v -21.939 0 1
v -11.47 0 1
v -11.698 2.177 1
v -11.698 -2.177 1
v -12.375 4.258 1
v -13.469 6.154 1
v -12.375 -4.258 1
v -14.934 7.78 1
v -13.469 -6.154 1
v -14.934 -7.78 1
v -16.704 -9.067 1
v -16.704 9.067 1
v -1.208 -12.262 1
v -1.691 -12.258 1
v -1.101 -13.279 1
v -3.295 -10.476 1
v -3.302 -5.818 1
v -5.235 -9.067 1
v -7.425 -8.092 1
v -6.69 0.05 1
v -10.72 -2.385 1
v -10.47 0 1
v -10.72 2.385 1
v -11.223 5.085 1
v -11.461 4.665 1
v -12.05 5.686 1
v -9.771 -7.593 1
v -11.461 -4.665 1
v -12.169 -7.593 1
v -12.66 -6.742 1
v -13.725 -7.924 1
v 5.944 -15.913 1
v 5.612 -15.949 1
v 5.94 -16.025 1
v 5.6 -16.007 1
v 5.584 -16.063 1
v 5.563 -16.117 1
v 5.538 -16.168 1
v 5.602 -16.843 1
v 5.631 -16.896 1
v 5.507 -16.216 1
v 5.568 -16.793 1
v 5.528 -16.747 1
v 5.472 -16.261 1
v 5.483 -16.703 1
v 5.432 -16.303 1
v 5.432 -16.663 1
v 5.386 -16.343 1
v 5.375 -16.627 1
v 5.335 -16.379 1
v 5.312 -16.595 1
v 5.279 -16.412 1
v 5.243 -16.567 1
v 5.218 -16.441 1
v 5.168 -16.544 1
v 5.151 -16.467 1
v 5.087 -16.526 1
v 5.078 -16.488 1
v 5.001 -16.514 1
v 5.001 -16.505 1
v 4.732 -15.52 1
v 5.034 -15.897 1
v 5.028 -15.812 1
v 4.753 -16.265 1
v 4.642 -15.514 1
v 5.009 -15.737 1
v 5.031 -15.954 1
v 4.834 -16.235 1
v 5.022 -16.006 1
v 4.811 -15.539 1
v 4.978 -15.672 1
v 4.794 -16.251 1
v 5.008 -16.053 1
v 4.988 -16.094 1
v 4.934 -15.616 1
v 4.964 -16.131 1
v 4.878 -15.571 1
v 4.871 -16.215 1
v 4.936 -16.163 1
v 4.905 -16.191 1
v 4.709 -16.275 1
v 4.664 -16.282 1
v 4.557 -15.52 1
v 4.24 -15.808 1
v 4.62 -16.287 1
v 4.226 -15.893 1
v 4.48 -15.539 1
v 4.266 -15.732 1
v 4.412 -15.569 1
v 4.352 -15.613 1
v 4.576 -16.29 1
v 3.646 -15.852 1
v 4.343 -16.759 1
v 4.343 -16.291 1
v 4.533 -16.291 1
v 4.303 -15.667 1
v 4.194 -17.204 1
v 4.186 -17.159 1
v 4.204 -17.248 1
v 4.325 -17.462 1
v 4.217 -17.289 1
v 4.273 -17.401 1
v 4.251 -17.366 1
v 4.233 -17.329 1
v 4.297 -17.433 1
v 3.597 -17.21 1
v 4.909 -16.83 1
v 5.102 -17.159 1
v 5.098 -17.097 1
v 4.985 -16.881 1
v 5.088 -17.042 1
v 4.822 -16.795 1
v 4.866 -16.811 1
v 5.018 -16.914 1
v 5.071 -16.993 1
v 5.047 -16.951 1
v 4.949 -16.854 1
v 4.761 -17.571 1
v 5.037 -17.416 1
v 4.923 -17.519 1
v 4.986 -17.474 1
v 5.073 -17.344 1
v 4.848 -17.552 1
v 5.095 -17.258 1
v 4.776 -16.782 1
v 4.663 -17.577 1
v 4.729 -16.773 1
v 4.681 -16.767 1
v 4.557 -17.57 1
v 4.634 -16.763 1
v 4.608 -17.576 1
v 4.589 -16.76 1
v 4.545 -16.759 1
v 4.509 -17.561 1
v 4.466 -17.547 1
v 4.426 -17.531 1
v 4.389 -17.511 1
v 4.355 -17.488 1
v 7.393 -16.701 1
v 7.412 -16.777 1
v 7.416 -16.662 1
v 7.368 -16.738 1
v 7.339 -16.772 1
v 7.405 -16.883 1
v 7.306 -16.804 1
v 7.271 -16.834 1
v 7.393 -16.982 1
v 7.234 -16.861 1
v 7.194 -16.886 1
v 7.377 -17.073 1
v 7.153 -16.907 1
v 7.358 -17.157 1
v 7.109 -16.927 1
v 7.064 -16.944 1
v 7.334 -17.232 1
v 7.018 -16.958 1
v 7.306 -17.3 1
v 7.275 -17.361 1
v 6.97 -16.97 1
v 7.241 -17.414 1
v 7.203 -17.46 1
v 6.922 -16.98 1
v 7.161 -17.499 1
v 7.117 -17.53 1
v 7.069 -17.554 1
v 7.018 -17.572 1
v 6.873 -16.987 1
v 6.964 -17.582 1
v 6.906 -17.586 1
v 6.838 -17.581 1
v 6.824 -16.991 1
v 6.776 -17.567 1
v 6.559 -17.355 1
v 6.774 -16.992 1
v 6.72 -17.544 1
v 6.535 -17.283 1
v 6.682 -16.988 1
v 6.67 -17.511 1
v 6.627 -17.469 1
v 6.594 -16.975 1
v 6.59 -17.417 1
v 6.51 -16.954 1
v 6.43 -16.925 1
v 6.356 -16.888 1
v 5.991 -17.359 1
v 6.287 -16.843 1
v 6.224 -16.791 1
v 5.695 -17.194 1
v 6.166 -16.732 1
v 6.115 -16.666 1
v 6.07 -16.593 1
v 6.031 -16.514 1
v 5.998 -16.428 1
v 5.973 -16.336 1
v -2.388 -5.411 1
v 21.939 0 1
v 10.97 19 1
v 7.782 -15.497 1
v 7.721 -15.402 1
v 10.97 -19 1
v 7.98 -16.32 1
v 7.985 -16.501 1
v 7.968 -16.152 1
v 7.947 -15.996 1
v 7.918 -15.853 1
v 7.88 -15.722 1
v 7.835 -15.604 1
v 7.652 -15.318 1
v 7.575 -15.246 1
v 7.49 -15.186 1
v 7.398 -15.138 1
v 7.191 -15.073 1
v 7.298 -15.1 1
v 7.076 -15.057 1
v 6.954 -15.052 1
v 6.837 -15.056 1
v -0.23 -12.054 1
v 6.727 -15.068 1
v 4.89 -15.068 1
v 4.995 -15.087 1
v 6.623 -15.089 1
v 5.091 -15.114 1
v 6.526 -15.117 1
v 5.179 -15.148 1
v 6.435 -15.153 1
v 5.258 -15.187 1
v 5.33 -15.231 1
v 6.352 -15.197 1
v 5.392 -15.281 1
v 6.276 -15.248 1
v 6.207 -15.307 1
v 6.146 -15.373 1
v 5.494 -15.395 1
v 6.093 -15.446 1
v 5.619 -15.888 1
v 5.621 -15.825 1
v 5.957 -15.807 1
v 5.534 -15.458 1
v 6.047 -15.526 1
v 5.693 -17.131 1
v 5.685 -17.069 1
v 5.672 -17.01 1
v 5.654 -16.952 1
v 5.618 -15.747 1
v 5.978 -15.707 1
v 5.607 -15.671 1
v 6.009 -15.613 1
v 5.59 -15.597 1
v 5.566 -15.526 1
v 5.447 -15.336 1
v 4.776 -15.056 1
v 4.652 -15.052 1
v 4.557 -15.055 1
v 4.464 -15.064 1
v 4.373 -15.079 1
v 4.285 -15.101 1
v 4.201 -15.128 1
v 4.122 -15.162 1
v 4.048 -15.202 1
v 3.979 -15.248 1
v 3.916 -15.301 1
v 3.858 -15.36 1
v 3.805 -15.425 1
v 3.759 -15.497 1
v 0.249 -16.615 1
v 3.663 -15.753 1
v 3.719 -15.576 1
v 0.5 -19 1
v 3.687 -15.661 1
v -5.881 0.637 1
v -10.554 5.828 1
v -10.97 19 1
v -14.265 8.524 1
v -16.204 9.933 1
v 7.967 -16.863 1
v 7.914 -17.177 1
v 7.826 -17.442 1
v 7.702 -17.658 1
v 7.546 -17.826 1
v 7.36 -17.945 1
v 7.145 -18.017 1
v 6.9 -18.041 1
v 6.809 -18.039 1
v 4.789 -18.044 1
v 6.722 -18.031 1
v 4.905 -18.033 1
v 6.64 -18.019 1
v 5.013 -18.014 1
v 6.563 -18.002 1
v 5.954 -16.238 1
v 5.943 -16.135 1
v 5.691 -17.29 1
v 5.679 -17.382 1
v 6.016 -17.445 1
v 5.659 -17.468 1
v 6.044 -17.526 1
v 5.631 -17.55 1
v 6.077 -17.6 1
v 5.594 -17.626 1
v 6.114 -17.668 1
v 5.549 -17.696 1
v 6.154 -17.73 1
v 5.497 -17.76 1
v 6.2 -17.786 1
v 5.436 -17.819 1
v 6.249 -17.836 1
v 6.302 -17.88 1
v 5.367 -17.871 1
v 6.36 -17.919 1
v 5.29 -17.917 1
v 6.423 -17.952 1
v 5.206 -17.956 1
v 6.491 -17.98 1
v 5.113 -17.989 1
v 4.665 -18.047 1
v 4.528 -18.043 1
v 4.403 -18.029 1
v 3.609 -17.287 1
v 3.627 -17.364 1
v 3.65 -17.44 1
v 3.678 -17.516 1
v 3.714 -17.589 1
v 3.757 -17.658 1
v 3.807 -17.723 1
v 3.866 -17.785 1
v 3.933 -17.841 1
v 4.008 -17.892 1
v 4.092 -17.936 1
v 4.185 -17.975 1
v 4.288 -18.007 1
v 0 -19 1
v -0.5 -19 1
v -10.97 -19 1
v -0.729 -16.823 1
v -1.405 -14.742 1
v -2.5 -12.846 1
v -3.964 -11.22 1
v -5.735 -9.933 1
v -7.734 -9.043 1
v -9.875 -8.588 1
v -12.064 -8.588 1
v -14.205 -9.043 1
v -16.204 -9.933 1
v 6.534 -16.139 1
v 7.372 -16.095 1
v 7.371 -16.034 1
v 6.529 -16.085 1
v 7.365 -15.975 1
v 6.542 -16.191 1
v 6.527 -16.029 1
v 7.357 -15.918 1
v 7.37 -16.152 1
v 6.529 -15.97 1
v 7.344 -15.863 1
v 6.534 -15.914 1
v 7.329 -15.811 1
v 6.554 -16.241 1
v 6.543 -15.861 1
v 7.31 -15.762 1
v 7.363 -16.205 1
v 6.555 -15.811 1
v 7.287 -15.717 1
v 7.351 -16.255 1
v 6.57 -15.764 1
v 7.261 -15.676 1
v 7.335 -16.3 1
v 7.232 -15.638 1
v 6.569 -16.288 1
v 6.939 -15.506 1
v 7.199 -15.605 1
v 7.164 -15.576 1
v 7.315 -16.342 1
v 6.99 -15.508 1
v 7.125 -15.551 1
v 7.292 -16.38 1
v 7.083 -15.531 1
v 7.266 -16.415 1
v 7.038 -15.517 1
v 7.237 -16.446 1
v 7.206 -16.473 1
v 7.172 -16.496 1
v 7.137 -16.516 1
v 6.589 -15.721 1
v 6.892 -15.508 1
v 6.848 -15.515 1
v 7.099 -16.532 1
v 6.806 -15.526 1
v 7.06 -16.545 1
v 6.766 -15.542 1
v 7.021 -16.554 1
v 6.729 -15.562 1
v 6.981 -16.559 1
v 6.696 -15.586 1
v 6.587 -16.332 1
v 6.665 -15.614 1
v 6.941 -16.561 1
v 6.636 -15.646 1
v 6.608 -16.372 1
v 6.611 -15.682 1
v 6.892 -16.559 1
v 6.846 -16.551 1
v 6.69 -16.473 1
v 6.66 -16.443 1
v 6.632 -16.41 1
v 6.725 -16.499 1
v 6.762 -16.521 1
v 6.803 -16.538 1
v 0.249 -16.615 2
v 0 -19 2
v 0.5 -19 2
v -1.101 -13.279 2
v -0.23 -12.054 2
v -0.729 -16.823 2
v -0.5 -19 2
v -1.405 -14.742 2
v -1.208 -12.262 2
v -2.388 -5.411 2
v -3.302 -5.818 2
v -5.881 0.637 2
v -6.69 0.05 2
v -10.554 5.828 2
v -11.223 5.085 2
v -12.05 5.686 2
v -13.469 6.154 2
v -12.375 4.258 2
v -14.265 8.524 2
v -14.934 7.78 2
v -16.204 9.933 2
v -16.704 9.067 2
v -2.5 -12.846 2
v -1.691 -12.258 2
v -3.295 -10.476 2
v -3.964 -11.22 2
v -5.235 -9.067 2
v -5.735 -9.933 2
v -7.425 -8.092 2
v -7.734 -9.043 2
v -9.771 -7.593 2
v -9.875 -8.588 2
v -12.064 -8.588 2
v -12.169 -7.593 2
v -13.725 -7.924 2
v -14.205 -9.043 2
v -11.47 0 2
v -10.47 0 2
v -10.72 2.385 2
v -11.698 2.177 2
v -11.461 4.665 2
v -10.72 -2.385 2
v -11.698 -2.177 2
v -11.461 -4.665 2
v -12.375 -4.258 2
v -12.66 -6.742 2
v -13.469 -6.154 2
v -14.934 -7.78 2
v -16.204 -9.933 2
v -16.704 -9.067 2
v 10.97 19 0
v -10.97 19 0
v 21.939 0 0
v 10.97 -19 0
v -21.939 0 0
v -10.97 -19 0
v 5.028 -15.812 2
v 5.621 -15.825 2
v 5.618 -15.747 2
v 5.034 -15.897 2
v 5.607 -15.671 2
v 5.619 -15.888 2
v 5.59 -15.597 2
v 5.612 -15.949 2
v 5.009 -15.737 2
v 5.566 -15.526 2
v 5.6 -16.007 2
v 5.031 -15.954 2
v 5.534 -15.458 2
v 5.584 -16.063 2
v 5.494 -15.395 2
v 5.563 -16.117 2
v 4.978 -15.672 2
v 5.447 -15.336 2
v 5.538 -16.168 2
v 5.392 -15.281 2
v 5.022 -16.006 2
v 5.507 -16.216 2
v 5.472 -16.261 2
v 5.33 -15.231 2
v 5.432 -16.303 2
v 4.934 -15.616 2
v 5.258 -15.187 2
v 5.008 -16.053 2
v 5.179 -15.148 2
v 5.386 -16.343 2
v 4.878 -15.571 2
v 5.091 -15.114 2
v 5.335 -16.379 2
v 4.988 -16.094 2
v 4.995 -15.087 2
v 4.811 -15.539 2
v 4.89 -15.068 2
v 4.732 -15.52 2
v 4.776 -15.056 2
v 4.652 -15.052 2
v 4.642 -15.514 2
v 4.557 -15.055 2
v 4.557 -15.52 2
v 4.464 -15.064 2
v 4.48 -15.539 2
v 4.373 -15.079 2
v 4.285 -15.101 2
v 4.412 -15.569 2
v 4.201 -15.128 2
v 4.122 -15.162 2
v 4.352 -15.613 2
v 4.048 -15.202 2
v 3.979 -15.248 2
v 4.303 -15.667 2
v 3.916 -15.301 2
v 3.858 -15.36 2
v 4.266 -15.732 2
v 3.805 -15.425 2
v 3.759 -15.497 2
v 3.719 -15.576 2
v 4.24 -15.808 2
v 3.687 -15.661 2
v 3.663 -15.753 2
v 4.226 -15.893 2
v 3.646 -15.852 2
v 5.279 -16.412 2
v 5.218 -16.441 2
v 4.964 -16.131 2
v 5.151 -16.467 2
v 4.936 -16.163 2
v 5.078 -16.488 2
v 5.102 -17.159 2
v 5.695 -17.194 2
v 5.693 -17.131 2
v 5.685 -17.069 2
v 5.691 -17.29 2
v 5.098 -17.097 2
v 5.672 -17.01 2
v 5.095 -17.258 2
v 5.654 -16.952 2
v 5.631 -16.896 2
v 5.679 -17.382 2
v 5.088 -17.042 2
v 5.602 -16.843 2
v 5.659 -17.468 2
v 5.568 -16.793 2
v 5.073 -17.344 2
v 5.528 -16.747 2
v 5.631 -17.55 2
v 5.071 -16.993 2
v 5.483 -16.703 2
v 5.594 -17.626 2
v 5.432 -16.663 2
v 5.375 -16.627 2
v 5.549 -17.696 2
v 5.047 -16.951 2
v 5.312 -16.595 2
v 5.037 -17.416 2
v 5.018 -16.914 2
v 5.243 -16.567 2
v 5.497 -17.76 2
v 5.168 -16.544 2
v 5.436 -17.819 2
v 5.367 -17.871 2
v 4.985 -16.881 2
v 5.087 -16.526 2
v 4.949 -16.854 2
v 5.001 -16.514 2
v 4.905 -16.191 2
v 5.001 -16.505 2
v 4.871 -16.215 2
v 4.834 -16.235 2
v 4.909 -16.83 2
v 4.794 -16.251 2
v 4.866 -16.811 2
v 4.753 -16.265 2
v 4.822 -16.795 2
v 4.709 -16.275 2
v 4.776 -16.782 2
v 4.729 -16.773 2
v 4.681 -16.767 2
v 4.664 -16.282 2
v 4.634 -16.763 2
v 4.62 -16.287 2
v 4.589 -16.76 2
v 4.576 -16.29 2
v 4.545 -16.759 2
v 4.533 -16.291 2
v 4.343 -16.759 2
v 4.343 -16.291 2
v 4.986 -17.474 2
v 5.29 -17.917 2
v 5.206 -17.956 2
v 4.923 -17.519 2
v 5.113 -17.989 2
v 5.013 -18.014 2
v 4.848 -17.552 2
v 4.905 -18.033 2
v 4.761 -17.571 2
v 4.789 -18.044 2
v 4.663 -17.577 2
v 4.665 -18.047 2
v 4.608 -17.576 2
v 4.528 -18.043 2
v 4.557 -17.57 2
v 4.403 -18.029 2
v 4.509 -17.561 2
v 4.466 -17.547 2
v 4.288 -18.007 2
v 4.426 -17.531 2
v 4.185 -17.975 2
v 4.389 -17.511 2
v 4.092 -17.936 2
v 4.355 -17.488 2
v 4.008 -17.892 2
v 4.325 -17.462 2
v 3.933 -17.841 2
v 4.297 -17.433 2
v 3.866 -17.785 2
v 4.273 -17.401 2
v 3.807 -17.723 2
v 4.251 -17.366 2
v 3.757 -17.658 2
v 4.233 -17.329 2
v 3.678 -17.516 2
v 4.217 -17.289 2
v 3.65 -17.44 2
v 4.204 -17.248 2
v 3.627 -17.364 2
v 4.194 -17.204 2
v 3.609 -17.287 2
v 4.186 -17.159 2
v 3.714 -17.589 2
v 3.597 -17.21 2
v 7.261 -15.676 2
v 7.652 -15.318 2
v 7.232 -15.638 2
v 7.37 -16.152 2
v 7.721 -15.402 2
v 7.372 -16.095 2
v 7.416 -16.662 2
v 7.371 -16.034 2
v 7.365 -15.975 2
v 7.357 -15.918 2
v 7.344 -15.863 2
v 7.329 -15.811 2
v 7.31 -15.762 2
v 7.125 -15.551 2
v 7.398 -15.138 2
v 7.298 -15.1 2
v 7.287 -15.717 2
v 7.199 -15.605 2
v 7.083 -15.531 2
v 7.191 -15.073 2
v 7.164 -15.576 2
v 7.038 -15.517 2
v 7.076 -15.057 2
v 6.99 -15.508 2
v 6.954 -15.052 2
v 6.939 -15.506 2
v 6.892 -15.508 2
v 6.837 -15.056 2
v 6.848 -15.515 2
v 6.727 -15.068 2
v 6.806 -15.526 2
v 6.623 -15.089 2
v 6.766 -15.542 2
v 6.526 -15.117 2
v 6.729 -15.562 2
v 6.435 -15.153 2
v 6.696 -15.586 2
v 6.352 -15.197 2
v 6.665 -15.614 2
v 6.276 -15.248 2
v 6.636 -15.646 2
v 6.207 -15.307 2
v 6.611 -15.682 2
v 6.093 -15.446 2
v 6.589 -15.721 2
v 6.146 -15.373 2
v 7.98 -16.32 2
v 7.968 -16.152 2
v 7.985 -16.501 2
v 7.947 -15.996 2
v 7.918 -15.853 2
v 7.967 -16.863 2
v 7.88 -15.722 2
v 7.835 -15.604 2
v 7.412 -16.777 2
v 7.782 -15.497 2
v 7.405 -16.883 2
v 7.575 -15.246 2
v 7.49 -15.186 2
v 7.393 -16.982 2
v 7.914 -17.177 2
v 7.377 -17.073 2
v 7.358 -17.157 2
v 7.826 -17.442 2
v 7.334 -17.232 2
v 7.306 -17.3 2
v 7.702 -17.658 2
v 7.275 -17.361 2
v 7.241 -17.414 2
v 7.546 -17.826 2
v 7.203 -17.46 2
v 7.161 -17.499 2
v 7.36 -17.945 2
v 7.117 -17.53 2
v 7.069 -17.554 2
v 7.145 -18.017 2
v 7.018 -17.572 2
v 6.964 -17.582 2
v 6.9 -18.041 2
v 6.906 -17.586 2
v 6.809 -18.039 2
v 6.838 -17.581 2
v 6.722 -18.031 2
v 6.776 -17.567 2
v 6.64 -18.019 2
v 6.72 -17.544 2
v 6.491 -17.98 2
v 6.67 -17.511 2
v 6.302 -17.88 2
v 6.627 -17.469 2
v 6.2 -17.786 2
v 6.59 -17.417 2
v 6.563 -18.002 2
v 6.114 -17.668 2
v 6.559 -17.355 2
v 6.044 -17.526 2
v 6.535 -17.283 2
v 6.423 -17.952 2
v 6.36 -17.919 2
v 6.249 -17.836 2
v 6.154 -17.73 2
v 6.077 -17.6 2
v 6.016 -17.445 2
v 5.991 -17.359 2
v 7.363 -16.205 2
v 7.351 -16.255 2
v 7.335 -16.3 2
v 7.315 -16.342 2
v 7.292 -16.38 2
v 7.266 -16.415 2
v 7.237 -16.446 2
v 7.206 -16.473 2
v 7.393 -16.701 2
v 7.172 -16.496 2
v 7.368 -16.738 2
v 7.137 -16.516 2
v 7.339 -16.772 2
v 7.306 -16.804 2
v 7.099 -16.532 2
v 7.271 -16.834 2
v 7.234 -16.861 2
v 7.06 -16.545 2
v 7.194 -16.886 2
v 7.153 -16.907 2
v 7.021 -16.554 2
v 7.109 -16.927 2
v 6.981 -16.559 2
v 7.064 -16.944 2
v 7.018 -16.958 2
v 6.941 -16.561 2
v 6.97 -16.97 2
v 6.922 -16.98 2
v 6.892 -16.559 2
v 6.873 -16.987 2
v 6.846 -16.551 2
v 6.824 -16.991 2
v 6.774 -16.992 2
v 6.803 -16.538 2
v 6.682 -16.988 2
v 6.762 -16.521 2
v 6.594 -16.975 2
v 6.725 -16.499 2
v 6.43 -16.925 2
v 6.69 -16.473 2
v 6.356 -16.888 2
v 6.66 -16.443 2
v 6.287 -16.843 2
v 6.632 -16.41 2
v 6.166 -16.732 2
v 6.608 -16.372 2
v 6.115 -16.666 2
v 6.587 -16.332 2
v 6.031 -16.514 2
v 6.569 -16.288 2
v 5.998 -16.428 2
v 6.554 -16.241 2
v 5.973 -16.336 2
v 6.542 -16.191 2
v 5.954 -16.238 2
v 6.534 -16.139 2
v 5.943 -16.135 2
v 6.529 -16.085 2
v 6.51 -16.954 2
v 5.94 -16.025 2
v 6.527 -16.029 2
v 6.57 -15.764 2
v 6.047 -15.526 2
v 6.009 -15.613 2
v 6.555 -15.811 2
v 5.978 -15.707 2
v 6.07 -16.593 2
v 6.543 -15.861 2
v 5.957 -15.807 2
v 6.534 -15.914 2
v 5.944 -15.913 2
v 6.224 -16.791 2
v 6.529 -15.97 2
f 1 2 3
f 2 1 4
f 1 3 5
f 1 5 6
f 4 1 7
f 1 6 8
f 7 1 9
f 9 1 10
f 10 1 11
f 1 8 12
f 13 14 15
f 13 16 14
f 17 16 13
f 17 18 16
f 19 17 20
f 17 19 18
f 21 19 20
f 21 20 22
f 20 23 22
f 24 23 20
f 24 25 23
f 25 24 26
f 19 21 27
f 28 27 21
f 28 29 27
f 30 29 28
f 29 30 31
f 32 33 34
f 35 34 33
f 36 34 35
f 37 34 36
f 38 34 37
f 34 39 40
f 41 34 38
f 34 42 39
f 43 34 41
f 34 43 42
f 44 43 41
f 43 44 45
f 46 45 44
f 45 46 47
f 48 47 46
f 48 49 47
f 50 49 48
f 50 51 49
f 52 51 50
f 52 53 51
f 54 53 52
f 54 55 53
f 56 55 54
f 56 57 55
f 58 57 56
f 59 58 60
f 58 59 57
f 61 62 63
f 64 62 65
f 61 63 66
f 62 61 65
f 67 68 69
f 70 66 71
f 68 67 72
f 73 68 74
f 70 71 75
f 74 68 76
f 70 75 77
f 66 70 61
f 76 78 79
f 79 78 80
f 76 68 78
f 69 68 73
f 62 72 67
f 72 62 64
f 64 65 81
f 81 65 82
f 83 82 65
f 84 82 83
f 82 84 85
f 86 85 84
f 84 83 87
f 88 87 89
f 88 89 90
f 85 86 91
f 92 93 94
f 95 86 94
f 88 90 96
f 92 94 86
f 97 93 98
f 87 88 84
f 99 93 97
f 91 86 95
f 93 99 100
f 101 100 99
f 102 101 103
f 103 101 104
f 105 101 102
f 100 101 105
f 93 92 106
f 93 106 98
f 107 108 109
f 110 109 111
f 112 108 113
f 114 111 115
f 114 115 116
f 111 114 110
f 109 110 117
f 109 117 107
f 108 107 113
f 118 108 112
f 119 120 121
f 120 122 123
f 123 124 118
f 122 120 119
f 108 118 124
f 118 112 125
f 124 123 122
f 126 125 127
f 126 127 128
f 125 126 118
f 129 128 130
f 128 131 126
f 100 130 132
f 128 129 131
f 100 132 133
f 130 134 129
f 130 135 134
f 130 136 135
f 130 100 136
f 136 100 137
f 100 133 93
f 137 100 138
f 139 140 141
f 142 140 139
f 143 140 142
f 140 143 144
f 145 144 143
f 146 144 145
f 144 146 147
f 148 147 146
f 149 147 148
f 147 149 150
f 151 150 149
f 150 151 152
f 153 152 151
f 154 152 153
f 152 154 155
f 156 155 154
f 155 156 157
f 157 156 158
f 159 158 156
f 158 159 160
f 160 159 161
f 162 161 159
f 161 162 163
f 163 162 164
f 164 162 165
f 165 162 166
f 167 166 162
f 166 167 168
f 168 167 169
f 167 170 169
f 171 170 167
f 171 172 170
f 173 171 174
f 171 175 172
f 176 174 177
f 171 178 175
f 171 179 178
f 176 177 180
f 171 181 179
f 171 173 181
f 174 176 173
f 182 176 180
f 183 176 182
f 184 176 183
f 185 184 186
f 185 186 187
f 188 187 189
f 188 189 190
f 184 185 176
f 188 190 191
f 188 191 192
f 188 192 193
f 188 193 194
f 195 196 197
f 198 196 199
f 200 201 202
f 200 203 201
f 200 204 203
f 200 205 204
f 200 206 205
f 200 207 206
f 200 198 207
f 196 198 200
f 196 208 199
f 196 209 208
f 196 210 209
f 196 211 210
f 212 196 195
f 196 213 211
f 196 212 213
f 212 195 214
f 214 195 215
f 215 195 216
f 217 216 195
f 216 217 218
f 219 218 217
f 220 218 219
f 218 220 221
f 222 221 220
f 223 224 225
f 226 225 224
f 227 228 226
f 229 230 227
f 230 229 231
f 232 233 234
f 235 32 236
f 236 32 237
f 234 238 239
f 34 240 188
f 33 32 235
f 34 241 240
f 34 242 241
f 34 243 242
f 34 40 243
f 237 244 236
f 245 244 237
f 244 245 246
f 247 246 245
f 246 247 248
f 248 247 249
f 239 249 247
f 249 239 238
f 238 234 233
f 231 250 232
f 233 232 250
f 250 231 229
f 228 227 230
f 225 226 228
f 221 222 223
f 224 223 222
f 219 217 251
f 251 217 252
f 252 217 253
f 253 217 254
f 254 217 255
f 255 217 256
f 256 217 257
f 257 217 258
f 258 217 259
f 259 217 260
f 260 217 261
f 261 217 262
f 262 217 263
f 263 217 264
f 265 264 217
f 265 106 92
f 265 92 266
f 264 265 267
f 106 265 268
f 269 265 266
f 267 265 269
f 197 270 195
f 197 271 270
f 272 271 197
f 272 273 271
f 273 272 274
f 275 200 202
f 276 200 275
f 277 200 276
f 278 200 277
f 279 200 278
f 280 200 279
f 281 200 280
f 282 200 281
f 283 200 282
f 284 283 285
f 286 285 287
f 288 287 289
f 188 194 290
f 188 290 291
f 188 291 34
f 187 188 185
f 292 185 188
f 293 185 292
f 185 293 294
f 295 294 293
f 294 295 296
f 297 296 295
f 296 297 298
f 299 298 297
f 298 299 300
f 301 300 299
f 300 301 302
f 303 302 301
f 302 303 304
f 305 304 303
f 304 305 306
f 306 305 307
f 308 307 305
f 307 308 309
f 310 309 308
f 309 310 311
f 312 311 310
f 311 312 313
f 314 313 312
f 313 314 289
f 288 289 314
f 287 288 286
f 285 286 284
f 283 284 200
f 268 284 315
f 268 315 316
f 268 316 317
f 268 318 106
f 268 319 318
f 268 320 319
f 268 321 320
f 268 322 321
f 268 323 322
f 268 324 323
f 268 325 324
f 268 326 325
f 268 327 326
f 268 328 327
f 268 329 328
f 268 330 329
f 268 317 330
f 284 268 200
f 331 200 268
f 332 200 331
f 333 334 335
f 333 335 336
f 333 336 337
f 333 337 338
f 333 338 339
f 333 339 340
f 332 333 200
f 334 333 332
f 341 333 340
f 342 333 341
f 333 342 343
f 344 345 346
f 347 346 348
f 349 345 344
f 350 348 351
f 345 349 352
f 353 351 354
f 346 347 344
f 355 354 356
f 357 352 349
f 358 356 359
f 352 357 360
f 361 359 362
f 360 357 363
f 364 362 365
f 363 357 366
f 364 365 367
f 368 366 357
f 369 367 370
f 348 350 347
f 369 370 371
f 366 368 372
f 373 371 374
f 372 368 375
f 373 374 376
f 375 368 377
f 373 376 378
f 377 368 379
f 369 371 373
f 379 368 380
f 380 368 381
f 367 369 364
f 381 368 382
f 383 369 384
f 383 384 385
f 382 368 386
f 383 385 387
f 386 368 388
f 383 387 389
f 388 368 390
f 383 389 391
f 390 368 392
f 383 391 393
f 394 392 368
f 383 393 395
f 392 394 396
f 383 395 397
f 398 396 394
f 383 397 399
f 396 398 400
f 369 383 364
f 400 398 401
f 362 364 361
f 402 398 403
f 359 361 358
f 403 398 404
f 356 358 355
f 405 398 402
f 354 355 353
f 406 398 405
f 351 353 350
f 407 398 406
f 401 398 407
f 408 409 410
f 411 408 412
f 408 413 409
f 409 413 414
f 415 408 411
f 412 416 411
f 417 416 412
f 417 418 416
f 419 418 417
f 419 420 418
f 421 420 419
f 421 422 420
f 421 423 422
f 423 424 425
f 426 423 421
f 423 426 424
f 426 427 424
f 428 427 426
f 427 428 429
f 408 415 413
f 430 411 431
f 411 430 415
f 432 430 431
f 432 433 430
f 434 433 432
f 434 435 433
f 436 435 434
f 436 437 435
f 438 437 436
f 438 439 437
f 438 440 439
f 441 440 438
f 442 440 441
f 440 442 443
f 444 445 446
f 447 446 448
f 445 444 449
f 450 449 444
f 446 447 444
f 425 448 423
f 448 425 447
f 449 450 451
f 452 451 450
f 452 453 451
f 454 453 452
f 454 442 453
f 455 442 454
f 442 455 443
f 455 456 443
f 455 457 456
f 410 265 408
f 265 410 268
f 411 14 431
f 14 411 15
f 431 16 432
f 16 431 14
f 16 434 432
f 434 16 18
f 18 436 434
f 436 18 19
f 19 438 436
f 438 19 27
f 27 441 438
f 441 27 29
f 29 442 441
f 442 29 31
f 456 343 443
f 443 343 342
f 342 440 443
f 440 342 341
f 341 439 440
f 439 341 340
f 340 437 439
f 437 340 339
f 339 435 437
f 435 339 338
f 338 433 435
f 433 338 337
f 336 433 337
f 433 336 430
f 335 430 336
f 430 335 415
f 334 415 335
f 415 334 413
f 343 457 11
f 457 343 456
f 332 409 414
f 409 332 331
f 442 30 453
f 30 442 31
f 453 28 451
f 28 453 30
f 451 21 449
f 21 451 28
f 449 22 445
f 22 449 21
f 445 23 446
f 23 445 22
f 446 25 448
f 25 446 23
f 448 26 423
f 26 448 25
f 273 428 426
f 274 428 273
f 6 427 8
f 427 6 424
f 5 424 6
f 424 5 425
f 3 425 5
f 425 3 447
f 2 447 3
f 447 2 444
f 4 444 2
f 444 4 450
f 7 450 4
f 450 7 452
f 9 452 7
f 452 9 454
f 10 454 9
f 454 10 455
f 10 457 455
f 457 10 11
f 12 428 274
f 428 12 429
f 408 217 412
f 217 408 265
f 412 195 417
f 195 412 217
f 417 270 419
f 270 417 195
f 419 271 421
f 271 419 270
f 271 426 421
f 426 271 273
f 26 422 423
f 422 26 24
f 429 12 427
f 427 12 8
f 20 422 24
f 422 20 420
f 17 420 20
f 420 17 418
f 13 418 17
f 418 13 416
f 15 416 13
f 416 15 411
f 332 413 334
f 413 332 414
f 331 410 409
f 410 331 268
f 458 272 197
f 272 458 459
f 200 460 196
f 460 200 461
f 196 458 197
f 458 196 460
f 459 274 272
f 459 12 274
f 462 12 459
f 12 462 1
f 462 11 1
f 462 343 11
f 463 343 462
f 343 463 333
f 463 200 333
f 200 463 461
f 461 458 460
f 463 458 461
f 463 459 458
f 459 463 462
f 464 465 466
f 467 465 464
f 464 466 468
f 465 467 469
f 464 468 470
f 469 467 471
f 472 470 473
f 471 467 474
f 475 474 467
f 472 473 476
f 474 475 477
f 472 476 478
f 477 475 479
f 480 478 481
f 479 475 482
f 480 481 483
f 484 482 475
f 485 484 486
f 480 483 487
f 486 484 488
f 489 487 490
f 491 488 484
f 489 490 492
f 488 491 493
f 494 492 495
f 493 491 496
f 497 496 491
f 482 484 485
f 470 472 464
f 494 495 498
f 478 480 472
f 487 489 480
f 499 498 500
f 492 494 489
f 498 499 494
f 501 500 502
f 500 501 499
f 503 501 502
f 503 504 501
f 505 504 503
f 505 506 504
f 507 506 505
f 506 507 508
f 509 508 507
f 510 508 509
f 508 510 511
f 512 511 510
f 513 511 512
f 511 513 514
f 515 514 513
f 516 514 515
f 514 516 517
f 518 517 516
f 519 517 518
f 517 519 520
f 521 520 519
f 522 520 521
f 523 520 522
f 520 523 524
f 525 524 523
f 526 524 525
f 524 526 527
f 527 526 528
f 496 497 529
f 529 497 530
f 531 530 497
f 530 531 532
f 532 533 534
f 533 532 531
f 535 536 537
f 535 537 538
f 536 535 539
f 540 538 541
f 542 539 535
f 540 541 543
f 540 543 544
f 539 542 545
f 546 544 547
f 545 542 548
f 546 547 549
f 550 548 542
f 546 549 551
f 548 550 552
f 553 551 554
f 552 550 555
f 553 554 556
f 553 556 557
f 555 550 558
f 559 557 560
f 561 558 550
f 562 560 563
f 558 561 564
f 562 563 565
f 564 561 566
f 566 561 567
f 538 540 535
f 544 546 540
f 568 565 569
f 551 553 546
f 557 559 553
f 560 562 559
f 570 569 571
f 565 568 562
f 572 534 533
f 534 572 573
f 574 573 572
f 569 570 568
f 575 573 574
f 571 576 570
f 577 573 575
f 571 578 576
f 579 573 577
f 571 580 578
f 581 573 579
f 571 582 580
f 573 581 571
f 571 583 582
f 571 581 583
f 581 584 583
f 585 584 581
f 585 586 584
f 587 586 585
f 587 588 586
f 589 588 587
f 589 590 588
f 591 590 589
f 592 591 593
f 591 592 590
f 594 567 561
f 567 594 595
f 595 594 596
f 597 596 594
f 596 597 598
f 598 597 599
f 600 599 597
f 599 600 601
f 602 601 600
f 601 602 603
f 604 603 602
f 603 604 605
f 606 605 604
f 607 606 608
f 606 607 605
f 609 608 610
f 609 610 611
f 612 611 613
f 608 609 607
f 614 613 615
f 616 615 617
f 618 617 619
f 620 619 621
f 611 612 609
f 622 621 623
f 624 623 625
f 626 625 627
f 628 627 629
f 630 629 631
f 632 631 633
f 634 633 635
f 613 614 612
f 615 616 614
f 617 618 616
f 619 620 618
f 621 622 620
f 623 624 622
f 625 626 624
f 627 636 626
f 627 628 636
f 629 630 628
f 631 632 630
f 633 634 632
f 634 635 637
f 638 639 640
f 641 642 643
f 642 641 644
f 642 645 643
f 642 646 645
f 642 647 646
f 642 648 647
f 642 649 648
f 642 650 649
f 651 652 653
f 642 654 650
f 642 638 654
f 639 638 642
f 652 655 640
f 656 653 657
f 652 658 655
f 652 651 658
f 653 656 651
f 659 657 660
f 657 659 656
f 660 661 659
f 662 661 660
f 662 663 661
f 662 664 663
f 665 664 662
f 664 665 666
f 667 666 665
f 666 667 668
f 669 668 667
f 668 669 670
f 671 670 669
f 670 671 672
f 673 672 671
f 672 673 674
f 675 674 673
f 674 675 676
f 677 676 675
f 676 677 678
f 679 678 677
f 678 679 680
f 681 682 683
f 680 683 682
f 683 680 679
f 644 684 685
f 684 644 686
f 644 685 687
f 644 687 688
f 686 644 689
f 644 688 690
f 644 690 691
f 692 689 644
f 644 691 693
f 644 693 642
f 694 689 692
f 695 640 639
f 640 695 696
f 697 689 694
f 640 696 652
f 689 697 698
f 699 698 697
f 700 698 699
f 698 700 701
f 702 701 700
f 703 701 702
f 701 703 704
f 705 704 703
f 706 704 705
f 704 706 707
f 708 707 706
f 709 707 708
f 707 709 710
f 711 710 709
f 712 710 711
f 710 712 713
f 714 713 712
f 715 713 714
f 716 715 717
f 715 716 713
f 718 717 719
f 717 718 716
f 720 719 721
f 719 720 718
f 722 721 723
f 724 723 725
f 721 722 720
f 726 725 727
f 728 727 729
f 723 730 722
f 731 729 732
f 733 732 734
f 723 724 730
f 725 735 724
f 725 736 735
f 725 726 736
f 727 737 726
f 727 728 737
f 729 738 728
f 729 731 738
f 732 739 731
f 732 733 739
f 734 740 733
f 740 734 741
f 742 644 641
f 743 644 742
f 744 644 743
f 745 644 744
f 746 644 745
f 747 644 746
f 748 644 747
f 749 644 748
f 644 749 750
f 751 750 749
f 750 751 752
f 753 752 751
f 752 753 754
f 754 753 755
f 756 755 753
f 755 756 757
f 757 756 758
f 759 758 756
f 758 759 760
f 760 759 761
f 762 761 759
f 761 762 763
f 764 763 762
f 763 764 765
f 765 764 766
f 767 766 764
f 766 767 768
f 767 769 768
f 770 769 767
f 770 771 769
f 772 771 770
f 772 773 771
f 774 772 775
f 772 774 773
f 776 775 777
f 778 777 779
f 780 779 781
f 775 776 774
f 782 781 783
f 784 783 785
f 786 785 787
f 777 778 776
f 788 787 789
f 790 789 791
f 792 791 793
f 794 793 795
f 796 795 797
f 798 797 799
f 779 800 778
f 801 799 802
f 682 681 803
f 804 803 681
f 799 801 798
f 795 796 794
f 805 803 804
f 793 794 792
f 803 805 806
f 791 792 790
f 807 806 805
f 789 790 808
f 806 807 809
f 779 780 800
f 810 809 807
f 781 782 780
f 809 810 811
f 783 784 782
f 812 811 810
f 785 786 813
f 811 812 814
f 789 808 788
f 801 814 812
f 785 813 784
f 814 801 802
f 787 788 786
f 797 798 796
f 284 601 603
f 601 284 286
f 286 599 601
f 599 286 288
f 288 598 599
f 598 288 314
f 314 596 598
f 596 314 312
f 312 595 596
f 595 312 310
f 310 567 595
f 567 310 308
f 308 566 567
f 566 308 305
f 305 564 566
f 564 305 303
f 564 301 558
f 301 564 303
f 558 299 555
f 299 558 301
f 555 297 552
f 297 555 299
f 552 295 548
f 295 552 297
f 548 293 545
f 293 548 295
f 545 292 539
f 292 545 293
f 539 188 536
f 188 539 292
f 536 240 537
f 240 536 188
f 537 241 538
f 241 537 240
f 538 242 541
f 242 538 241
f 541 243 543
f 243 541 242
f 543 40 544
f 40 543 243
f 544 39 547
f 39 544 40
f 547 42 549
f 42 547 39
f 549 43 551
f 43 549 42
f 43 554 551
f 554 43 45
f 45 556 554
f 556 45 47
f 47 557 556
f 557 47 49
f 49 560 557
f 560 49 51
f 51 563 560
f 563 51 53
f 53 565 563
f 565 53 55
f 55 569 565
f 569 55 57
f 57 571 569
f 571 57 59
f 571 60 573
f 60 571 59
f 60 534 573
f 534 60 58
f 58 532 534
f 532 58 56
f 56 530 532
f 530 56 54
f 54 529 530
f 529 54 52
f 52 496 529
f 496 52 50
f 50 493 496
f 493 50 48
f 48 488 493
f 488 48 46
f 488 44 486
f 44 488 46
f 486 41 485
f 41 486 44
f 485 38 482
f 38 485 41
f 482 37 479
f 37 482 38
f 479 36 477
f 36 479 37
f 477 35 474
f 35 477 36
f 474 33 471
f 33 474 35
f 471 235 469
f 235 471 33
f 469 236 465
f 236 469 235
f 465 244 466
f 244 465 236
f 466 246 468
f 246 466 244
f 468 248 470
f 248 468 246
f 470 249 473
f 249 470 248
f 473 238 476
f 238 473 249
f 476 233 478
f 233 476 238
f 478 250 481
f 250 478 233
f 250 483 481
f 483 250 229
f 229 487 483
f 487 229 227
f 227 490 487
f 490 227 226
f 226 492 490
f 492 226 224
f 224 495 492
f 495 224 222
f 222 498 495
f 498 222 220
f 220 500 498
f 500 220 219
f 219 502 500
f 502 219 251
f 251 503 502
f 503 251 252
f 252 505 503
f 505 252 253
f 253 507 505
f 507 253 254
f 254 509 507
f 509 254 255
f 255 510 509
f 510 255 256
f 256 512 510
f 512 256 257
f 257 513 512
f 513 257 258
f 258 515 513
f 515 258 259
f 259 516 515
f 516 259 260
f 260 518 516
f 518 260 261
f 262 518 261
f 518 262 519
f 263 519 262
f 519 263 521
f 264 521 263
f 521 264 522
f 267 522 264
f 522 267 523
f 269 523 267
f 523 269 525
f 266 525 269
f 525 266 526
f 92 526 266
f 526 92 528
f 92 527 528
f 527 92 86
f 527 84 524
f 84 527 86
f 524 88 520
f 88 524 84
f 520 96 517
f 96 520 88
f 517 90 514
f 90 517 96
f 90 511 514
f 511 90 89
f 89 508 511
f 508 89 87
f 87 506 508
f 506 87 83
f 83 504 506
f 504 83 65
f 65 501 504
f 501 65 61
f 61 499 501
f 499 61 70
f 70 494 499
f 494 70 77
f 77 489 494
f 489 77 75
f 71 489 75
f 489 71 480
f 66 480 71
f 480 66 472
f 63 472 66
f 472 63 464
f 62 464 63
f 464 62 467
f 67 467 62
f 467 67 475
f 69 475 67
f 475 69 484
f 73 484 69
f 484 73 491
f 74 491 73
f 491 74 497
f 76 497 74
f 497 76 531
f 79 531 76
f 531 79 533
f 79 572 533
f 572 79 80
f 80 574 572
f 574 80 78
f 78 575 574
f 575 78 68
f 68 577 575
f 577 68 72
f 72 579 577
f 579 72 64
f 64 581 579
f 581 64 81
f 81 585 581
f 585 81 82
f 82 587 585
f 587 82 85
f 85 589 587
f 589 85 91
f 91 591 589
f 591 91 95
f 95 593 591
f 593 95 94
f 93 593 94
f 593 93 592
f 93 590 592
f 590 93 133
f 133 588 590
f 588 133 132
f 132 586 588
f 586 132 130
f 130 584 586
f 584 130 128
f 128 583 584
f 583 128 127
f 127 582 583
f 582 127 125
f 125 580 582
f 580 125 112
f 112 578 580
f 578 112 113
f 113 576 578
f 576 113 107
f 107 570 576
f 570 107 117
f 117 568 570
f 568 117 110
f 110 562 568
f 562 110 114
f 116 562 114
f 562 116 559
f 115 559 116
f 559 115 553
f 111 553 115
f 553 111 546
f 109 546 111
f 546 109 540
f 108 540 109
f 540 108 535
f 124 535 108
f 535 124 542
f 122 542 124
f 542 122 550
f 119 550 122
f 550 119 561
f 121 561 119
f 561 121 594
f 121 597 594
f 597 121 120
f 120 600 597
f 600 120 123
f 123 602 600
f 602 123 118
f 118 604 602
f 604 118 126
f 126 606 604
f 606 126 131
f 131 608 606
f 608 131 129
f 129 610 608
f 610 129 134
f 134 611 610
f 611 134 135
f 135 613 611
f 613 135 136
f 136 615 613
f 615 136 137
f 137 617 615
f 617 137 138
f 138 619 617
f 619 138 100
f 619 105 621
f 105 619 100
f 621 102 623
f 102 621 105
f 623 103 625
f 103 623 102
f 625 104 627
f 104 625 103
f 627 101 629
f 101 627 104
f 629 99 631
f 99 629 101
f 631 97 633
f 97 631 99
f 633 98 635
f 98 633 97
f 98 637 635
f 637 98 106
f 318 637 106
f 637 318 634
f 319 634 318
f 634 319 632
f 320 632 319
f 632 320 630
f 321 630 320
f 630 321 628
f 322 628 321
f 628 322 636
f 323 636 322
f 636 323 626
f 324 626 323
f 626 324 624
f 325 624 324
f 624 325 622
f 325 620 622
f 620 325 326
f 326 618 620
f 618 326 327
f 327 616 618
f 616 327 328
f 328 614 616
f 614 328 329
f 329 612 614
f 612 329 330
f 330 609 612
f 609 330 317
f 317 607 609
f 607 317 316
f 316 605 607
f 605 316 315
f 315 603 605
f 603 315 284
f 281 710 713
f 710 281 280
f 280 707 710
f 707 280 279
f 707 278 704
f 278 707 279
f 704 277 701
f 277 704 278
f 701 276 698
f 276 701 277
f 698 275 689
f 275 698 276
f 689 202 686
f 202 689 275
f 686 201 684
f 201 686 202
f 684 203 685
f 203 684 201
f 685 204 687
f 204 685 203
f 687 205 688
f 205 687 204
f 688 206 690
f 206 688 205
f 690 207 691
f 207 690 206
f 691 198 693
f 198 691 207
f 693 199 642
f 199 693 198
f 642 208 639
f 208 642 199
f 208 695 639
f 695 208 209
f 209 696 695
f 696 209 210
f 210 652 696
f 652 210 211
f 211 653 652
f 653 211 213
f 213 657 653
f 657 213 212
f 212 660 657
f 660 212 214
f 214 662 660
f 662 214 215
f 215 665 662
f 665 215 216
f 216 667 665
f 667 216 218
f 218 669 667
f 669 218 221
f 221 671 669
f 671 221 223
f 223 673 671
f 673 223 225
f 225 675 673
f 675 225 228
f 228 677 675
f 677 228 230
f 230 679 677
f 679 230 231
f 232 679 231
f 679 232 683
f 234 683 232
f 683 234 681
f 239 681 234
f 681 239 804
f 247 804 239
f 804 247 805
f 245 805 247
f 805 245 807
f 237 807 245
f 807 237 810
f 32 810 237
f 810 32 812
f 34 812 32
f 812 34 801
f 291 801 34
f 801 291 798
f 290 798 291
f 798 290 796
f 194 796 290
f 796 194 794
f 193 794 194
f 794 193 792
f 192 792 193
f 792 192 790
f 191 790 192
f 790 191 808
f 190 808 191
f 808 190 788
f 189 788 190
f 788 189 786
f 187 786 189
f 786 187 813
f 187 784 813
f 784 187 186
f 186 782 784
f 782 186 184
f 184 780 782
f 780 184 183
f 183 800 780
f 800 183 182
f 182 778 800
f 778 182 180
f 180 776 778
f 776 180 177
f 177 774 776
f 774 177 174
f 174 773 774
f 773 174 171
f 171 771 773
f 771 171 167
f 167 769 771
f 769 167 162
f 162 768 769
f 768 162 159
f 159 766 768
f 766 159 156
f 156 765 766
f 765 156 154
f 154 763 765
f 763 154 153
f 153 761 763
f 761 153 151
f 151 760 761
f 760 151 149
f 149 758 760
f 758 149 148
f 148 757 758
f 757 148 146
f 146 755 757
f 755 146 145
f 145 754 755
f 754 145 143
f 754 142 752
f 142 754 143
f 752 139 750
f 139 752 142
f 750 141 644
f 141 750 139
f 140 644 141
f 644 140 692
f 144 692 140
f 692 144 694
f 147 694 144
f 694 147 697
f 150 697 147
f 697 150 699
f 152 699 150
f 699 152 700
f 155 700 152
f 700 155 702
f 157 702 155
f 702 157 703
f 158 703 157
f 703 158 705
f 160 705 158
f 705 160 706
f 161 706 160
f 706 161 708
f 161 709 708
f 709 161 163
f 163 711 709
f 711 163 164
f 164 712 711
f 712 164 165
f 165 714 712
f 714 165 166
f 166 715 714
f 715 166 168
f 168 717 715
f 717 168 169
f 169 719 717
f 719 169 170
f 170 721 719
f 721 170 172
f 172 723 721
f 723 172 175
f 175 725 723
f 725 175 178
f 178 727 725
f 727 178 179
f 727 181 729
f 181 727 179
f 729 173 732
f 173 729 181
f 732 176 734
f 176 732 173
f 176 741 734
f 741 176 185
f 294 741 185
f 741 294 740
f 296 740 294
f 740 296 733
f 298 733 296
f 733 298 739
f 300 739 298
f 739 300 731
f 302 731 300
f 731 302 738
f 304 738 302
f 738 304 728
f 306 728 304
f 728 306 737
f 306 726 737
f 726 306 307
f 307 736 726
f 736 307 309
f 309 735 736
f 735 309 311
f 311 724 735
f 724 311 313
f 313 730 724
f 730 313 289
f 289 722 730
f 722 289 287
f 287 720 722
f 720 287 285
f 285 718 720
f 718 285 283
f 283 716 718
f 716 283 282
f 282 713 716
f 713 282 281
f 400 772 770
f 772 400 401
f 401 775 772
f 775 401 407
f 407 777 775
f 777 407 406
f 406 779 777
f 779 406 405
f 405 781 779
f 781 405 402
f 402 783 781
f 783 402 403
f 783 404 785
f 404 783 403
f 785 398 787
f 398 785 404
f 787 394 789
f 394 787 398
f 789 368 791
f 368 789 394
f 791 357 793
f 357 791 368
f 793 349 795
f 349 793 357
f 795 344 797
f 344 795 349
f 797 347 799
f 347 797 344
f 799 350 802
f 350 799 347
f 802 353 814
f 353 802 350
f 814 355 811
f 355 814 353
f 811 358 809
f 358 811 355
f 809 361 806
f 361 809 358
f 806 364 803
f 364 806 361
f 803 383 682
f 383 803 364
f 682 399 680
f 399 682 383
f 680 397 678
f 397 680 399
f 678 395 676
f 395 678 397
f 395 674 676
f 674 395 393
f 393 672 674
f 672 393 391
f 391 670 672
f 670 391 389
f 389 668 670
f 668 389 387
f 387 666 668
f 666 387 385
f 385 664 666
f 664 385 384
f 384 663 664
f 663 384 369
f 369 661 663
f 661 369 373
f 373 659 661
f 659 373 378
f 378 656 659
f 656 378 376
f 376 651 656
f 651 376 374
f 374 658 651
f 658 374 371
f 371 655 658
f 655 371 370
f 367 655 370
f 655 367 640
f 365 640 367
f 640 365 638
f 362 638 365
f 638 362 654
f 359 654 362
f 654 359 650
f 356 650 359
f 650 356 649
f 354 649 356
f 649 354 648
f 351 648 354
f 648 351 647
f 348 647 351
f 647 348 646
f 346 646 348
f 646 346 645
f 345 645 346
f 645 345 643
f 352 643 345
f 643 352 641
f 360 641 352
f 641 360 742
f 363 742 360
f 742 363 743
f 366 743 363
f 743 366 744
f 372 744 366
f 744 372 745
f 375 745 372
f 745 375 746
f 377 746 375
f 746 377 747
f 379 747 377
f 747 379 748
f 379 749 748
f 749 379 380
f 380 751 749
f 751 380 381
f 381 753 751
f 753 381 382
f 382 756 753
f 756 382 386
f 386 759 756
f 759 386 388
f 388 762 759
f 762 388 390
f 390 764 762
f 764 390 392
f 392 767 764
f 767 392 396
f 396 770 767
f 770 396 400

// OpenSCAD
include <../Scripts/18xx tiles basic functions.scad>
hex("Brown");
put_tilenr("39");
sharp_curve(r=5);
sharp_curve(r=4);
light_curve(r=4);
